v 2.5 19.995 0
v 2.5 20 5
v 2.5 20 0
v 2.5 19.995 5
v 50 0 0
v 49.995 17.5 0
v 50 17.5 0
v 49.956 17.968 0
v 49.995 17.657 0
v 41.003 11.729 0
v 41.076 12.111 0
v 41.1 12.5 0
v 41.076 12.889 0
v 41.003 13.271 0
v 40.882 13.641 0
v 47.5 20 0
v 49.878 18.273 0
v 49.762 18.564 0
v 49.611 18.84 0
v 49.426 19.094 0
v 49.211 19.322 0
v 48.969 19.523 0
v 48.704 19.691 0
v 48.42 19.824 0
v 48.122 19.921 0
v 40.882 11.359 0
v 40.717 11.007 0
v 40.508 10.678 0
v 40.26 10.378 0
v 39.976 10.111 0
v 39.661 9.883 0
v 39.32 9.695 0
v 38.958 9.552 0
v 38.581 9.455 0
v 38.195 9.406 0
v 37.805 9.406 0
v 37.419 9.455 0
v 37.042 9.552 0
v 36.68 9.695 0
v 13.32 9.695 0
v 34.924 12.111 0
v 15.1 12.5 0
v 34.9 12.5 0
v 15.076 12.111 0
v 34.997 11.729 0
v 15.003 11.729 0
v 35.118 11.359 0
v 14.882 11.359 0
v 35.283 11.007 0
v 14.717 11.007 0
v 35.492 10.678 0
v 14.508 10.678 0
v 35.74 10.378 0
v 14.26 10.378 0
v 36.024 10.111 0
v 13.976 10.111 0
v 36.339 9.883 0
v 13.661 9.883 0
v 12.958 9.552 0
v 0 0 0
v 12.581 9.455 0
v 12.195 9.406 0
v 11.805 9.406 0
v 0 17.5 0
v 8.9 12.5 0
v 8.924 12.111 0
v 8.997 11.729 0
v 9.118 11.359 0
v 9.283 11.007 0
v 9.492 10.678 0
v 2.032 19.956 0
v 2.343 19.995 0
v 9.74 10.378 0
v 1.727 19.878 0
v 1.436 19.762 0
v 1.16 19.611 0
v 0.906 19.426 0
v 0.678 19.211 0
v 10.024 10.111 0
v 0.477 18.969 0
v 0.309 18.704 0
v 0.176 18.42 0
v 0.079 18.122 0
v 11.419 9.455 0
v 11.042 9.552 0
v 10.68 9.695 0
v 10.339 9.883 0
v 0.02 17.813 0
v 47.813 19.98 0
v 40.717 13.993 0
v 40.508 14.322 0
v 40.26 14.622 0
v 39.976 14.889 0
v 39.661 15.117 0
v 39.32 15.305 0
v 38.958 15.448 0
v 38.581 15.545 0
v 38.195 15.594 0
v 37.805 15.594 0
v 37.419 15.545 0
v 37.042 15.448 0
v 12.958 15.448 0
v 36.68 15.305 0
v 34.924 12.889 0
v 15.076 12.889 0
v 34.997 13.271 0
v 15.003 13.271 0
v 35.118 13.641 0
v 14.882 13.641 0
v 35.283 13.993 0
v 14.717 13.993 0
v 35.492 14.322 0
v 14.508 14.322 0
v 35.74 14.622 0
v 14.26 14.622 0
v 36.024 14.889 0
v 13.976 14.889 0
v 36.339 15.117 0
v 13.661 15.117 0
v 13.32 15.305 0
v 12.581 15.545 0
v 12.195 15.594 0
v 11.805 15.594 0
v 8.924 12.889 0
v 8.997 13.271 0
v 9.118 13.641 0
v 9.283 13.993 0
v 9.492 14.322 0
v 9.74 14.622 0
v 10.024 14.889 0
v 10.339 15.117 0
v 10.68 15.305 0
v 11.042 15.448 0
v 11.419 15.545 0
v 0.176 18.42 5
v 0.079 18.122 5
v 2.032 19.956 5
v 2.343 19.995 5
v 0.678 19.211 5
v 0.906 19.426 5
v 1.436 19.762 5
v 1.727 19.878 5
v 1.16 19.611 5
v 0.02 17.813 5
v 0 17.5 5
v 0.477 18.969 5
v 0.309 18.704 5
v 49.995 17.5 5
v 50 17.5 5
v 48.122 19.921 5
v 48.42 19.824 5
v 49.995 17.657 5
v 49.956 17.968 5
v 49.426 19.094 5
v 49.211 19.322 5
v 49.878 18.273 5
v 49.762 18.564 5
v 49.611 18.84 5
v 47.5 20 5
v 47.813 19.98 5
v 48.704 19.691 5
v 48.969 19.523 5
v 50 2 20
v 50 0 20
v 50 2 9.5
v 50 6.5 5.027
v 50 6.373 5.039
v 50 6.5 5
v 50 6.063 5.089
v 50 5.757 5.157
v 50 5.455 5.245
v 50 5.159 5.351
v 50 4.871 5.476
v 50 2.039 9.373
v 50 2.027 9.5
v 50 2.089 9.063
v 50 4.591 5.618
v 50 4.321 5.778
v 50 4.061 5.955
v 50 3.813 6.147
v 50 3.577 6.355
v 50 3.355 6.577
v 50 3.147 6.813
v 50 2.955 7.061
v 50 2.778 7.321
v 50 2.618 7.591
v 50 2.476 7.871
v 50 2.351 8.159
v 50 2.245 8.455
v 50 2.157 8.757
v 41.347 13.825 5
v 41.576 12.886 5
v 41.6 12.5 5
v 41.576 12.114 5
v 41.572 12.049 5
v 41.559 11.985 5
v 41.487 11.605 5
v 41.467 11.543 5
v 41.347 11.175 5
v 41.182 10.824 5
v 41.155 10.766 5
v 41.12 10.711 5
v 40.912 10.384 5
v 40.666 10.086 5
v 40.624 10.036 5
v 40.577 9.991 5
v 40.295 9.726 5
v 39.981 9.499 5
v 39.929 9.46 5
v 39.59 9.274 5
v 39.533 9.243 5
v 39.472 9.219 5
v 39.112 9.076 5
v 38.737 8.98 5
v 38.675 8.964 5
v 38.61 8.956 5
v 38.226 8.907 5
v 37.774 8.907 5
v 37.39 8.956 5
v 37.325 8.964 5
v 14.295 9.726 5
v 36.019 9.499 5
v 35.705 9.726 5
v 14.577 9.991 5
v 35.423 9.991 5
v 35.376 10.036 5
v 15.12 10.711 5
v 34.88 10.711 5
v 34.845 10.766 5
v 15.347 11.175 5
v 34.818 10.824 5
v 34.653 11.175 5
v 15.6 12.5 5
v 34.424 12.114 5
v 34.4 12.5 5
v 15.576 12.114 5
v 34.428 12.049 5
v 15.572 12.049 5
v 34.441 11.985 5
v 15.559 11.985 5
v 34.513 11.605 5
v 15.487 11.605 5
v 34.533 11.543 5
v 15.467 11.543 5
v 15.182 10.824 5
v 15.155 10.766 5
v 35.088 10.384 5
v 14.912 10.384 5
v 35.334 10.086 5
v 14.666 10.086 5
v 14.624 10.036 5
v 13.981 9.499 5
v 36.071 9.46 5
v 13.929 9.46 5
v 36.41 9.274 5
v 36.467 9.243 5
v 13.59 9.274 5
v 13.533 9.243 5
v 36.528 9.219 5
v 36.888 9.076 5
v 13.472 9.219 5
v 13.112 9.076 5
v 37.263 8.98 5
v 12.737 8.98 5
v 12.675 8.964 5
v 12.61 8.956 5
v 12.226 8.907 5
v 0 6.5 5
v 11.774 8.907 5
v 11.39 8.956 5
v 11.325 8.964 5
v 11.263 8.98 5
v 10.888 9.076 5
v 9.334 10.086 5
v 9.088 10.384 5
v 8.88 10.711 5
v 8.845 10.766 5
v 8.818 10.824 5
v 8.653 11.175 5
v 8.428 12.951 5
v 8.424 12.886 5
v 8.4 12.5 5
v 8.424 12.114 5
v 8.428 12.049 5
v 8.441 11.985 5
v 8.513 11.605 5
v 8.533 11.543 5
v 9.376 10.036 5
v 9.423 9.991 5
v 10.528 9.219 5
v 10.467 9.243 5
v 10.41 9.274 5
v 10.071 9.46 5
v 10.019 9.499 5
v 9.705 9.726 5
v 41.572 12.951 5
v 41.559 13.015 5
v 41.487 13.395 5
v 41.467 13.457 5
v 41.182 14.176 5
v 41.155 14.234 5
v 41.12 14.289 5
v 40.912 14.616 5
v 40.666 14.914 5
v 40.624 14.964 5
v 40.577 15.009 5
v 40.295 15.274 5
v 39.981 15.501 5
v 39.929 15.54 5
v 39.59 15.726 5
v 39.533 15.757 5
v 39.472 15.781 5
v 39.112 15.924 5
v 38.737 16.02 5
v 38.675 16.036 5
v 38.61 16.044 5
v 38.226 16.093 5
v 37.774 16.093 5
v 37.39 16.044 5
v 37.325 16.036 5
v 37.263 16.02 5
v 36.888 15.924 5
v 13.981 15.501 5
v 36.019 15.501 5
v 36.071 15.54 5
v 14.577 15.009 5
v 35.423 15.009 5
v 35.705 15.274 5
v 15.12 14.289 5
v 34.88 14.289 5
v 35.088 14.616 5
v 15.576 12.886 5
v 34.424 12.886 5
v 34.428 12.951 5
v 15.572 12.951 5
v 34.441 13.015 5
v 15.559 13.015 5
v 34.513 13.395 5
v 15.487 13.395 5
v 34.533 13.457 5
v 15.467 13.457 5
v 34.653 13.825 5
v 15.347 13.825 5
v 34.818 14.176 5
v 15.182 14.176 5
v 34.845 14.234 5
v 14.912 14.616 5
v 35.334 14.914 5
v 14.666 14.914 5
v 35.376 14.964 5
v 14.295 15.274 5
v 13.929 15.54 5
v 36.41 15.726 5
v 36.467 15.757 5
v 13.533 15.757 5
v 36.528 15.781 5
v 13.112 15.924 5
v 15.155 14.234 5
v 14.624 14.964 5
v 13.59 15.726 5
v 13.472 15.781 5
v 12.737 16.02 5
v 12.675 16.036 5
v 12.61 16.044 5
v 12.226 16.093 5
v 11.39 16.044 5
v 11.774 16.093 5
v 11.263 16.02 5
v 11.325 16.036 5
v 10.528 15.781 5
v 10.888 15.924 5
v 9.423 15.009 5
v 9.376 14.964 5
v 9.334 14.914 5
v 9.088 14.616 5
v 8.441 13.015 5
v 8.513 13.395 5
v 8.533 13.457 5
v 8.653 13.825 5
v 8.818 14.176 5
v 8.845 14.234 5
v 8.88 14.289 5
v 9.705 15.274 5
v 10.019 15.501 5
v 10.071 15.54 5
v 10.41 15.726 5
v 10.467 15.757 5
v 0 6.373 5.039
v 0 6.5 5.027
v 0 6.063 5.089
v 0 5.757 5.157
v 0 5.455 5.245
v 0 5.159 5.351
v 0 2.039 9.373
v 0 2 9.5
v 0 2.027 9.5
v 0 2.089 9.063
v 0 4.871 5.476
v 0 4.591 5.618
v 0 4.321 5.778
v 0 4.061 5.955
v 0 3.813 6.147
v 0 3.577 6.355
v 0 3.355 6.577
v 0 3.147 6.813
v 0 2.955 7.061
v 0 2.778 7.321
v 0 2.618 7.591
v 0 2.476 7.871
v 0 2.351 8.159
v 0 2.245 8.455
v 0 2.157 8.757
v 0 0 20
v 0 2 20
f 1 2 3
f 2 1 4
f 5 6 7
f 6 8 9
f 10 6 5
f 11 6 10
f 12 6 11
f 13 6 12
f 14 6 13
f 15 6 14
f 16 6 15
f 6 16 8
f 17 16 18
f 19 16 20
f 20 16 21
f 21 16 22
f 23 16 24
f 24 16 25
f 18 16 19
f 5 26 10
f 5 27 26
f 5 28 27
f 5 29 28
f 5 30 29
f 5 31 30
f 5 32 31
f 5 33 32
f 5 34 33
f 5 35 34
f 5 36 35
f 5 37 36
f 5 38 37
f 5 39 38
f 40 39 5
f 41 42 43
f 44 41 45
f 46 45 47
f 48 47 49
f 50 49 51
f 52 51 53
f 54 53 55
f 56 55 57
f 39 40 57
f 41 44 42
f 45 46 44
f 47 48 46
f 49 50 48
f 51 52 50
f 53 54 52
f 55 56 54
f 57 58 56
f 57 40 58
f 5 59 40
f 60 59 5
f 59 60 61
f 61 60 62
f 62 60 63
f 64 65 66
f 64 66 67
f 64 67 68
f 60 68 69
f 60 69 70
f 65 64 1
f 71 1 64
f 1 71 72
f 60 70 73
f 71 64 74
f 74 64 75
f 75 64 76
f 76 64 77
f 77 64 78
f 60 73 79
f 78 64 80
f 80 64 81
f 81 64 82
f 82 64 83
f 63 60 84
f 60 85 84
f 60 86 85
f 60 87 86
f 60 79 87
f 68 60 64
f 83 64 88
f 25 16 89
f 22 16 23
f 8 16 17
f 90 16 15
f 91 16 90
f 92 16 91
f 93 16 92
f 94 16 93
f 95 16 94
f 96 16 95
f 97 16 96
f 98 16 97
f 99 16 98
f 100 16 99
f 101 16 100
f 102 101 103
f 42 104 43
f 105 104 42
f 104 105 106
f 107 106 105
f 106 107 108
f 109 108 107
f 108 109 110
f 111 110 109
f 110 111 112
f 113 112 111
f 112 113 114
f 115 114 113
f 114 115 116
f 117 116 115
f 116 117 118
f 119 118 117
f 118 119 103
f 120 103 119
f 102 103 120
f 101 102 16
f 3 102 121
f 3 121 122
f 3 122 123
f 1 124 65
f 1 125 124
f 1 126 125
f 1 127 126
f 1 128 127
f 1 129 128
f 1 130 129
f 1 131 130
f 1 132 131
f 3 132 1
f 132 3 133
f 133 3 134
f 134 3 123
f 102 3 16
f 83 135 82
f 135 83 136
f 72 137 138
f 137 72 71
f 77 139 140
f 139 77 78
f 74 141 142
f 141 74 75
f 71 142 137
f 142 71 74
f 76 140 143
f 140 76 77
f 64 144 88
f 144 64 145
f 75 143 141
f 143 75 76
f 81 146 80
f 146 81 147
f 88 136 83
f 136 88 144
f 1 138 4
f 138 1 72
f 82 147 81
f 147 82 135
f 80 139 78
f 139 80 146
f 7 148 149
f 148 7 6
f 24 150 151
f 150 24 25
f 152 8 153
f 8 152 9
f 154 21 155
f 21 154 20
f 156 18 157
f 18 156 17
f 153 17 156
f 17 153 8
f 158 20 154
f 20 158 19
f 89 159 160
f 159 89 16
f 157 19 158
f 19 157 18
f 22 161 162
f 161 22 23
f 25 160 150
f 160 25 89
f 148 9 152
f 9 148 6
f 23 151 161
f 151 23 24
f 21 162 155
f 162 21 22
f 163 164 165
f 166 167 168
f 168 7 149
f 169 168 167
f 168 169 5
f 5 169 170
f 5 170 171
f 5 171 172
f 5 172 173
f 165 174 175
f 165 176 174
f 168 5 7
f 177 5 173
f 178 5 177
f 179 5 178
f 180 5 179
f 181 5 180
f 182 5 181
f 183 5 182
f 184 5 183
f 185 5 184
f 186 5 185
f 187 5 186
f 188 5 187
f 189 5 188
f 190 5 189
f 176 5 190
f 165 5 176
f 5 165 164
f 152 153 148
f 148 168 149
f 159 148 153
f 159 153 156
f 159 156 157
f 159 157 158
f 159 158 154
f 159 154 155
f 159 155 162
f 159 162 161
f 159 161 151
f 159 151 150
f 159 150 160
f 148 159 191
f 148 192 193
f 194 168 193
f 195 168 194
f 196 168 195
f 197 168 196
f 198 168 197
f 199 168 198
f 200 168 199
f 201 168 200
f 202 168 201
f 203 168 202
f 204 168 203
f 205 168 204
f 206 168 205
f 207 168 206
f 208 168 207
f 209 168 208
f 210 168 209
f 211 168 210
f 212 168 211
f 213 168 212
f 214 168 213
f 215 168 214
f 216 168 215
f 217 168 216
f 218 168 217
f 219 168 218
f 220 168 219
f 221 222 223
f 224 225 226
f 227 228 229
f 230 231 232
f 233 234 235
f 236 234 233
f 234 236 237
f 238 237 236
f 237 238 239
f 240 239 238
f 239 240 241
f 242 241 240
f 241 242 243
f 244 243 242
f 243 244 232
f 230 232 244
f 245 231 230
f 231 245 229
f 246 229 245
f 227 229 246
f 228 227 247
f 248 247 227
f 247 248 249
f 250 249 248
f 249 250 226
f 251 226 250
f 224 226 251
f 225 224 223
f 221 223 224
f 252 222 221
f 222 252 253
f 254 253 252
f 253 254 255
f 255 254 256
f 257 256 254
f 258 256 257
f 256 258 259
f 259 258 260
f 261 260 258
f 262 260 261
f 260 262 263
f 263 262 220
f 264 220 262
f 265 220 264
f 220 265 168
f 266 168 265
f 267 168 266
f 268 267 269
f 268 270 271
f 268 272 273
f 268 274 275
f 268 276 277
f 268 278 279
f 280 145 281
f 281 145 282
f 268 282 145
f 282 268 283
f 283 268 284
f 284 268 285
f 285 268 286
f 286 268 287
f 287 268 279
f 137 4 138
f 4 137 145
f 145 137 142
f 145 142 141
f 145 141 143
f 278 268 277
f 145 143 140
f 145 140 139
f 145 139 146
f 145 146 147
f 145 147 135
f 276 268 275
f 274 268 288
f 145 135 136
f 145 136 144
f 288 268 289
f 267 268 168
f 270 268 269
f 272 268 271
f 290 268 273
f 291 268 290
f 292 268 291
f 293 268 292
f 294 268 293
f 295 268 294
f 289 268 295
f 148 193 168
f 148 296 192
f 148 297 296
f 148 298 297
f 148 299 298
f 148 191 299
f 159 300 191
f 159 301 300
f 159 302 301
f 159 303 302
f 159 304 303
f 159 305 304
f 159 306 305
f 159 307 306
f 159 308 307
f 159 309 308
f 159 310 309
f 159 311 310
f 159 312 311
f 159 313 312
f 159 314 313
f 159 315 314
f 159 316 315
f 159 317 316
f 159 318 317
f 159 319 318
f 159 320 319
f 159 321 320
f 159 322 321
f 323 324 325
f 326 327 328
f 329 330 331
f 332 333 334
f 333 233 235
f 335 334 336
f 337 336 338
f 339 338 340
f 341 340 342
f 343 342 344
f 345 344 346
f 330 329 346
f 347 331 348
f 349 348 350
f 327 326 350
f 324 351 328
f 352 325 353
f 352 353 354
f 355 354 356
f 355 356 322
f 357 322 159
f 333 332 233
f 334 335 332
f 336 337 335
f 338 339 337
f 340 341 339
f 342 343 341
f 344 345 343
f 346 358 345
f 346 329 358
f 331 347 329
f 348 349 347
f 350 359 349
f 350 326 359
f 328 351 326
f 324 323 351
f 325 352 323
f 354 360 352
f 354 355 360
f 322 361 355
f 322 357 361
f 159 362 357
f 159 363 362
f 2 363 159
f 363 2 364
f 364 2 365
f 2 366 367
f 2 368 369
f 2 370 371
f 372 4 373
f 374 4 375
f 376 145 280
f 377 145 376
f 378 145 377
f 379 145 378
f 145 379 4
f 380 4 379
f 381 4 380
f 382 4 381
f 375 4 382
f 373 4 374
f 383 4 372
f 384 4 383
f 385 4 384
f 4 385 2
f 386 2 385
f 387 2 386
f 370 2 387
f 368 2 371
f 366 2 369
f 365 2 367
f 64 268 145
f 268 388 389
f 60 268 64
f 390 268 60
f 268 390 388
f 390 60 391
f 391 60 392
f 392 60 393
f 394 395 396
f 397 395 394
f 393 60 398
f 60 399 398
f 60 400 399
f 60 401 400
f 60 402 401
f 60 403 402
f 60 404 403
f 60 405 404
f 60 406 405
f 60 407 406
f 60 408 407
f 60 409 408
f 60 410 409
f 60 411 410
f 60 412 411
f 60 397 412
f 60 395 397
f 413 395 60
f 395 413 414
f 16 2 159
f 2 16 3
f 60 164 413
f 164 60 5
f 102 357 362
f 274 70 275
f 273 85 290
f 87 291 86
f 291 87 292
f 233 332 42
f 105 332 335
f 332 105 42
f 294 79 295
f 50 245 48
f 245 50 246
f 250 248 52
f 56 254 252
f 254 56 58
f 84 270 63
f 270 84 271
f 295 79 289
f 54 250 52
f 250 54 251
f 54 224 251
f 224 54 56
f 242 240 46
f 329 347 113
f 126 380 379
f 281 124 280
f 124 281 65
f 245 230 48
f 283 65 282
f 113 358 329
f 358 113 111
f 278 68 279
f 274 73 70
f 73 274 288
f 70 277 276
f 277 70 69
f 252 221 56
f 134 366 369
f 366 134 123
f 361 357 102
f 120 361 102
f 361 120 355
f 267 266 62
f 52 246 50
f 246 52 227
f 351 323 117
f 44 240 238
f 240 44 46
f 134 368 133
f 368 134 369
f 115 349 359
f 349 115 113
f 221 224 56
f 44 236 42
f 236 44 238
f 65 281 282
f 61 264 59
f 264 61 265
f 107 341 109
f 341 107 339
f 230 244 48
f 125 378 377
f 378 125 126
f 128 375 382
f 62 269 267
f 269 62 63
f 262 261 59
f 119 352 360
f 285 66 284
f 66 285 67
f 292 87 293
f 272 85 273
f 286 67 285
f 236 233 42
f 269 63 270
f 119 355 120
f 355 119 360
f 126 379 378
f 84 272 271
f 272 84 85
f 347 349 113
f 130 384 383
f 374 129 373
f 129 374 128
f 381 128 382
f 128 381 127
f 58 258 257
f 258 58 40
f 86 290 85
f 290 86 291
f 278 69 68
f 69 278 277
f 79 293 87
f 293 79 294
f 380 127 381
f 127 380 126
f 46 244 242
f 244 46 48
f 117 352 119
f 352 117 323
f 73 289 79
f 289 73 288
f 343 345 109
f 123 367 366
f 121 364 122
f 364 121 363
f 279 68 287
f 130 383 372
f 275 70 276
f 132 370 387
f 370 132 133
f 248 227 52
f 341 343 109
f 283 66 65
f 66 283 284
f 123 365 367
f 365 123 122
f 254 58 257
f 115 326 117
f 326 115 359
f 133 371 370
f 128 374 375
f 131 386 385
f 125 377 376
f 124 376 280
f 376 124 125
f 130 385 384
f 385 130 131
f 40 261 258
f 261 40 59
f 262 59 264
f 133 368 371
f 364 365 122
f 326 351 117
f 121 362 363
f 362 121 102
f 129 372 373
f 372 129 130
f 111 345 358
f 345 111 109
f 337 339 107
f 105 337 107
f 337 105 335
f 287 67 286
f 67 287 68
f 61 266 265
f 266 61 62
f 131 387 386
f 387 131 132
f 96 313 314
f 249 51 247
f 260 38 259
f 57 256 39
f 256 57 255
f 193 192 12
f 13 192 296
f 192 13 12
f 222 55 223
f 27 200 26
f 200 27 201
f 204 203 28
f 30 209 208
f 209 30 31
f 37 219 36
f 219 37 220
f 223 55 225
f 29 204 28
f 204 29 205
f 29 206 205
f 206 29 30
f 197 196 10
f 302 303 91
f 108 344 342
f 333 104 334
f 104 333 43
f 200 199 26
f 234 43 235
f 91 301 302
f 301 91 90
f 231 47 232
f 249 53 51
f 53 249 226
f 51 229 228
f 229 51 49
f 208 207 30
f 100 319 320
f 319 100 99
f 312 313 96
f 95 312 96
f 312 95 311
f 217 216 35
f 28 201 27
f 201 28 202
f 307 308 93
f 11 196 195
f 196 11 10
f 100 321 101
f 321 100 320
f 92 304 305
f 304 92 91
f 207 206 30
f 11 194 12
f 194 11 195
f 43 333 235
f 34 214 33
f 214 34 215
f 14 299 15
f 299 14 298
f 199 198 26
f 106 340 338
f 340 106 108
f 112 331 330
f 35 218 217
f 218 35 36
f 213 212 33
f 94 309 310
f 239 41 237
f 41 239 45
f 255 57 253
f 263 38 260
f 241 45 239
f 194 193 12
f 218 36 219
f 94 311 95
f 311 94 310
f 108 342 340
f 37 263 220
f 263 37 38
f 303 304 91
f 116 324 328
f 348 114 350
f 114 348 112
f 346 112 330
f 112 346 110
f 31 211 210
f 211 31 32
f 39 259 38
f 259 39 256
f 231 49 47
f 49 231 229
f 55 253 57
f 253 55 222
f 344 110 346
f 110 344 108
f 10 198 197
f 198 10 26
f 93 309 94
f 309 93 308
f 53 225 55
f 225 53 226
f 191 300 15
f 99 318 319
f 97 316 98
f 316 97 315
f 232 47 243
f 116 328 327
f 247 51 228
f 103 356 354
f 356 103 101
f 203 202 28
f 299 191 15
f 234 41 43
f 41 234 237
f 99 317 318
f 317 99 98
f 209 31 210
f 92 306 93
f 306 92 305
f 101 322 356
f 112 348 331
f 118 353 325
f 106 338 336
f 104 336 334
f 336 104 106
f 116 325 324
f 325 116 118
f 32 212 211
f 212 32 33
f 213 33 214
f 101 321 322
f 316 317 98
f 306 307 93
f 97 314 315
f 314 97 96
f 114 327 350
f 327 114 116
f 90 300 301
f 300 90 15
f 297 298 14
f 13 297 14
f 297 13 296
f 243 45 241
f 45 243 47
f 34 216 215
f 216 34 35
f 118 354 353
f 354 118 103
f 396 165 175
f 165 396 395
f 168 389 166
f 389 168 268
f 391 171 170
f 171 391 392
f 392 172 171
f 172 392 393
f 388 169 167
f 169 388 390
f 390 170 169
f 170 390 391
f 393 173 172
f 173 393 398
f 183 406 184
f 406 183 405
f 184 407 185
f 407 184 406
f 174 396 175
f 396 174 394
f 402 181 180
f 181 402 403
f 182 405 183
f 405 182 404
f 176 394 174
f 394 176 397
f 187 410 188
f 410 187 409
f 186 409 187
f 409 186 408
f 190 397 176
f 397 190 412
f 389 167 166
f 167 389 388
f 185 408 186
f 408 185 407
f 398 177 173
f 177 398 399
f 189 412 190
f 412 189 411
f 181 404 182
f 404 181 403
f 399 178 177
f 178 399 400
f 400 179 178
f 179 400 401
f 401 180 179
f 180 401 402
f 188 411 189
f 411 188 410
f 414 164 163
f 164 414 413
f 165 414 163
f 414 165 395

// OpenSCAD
difference() {
    cube([50,20,5]);
    translate([12, 12.5, 0]) cylinder(h=6, r1=3.1, r2=3.7, $fn=50);
    translate([38, 12.5, 0]) cylinder(h=6, r1=3.1, r2=3.7, $fn=50);
    bordino (2.5,17.5,0, $fn=50) ;
    bordino (-17.5,47.5,270, $fn=50);
}
    
cube([50,2, 20]);
translate ([50,06.5,9.5]) rotate([0,180,90]) paretina (5,50, 0.5);





//MODULI
    
module paretina (lato, lunghezza, offset) {
    difference () {
        cube([lato,lunghezza,lato]);
        rotate ([-90,0,0]) translate ([-offset,offset,0]) cylinder (h = lunghezza+2, r=lato, $fn=100);
    }
}   

module bordino (xoff, yoff, zrot) {
    rotate ([0,0, zrot]) translate ([xoff,yoff,0]) difference() {
        translate([-5,0,0]) cube([5,5,6]);
        cylinder(h=6, r=2.5);
    }
}
